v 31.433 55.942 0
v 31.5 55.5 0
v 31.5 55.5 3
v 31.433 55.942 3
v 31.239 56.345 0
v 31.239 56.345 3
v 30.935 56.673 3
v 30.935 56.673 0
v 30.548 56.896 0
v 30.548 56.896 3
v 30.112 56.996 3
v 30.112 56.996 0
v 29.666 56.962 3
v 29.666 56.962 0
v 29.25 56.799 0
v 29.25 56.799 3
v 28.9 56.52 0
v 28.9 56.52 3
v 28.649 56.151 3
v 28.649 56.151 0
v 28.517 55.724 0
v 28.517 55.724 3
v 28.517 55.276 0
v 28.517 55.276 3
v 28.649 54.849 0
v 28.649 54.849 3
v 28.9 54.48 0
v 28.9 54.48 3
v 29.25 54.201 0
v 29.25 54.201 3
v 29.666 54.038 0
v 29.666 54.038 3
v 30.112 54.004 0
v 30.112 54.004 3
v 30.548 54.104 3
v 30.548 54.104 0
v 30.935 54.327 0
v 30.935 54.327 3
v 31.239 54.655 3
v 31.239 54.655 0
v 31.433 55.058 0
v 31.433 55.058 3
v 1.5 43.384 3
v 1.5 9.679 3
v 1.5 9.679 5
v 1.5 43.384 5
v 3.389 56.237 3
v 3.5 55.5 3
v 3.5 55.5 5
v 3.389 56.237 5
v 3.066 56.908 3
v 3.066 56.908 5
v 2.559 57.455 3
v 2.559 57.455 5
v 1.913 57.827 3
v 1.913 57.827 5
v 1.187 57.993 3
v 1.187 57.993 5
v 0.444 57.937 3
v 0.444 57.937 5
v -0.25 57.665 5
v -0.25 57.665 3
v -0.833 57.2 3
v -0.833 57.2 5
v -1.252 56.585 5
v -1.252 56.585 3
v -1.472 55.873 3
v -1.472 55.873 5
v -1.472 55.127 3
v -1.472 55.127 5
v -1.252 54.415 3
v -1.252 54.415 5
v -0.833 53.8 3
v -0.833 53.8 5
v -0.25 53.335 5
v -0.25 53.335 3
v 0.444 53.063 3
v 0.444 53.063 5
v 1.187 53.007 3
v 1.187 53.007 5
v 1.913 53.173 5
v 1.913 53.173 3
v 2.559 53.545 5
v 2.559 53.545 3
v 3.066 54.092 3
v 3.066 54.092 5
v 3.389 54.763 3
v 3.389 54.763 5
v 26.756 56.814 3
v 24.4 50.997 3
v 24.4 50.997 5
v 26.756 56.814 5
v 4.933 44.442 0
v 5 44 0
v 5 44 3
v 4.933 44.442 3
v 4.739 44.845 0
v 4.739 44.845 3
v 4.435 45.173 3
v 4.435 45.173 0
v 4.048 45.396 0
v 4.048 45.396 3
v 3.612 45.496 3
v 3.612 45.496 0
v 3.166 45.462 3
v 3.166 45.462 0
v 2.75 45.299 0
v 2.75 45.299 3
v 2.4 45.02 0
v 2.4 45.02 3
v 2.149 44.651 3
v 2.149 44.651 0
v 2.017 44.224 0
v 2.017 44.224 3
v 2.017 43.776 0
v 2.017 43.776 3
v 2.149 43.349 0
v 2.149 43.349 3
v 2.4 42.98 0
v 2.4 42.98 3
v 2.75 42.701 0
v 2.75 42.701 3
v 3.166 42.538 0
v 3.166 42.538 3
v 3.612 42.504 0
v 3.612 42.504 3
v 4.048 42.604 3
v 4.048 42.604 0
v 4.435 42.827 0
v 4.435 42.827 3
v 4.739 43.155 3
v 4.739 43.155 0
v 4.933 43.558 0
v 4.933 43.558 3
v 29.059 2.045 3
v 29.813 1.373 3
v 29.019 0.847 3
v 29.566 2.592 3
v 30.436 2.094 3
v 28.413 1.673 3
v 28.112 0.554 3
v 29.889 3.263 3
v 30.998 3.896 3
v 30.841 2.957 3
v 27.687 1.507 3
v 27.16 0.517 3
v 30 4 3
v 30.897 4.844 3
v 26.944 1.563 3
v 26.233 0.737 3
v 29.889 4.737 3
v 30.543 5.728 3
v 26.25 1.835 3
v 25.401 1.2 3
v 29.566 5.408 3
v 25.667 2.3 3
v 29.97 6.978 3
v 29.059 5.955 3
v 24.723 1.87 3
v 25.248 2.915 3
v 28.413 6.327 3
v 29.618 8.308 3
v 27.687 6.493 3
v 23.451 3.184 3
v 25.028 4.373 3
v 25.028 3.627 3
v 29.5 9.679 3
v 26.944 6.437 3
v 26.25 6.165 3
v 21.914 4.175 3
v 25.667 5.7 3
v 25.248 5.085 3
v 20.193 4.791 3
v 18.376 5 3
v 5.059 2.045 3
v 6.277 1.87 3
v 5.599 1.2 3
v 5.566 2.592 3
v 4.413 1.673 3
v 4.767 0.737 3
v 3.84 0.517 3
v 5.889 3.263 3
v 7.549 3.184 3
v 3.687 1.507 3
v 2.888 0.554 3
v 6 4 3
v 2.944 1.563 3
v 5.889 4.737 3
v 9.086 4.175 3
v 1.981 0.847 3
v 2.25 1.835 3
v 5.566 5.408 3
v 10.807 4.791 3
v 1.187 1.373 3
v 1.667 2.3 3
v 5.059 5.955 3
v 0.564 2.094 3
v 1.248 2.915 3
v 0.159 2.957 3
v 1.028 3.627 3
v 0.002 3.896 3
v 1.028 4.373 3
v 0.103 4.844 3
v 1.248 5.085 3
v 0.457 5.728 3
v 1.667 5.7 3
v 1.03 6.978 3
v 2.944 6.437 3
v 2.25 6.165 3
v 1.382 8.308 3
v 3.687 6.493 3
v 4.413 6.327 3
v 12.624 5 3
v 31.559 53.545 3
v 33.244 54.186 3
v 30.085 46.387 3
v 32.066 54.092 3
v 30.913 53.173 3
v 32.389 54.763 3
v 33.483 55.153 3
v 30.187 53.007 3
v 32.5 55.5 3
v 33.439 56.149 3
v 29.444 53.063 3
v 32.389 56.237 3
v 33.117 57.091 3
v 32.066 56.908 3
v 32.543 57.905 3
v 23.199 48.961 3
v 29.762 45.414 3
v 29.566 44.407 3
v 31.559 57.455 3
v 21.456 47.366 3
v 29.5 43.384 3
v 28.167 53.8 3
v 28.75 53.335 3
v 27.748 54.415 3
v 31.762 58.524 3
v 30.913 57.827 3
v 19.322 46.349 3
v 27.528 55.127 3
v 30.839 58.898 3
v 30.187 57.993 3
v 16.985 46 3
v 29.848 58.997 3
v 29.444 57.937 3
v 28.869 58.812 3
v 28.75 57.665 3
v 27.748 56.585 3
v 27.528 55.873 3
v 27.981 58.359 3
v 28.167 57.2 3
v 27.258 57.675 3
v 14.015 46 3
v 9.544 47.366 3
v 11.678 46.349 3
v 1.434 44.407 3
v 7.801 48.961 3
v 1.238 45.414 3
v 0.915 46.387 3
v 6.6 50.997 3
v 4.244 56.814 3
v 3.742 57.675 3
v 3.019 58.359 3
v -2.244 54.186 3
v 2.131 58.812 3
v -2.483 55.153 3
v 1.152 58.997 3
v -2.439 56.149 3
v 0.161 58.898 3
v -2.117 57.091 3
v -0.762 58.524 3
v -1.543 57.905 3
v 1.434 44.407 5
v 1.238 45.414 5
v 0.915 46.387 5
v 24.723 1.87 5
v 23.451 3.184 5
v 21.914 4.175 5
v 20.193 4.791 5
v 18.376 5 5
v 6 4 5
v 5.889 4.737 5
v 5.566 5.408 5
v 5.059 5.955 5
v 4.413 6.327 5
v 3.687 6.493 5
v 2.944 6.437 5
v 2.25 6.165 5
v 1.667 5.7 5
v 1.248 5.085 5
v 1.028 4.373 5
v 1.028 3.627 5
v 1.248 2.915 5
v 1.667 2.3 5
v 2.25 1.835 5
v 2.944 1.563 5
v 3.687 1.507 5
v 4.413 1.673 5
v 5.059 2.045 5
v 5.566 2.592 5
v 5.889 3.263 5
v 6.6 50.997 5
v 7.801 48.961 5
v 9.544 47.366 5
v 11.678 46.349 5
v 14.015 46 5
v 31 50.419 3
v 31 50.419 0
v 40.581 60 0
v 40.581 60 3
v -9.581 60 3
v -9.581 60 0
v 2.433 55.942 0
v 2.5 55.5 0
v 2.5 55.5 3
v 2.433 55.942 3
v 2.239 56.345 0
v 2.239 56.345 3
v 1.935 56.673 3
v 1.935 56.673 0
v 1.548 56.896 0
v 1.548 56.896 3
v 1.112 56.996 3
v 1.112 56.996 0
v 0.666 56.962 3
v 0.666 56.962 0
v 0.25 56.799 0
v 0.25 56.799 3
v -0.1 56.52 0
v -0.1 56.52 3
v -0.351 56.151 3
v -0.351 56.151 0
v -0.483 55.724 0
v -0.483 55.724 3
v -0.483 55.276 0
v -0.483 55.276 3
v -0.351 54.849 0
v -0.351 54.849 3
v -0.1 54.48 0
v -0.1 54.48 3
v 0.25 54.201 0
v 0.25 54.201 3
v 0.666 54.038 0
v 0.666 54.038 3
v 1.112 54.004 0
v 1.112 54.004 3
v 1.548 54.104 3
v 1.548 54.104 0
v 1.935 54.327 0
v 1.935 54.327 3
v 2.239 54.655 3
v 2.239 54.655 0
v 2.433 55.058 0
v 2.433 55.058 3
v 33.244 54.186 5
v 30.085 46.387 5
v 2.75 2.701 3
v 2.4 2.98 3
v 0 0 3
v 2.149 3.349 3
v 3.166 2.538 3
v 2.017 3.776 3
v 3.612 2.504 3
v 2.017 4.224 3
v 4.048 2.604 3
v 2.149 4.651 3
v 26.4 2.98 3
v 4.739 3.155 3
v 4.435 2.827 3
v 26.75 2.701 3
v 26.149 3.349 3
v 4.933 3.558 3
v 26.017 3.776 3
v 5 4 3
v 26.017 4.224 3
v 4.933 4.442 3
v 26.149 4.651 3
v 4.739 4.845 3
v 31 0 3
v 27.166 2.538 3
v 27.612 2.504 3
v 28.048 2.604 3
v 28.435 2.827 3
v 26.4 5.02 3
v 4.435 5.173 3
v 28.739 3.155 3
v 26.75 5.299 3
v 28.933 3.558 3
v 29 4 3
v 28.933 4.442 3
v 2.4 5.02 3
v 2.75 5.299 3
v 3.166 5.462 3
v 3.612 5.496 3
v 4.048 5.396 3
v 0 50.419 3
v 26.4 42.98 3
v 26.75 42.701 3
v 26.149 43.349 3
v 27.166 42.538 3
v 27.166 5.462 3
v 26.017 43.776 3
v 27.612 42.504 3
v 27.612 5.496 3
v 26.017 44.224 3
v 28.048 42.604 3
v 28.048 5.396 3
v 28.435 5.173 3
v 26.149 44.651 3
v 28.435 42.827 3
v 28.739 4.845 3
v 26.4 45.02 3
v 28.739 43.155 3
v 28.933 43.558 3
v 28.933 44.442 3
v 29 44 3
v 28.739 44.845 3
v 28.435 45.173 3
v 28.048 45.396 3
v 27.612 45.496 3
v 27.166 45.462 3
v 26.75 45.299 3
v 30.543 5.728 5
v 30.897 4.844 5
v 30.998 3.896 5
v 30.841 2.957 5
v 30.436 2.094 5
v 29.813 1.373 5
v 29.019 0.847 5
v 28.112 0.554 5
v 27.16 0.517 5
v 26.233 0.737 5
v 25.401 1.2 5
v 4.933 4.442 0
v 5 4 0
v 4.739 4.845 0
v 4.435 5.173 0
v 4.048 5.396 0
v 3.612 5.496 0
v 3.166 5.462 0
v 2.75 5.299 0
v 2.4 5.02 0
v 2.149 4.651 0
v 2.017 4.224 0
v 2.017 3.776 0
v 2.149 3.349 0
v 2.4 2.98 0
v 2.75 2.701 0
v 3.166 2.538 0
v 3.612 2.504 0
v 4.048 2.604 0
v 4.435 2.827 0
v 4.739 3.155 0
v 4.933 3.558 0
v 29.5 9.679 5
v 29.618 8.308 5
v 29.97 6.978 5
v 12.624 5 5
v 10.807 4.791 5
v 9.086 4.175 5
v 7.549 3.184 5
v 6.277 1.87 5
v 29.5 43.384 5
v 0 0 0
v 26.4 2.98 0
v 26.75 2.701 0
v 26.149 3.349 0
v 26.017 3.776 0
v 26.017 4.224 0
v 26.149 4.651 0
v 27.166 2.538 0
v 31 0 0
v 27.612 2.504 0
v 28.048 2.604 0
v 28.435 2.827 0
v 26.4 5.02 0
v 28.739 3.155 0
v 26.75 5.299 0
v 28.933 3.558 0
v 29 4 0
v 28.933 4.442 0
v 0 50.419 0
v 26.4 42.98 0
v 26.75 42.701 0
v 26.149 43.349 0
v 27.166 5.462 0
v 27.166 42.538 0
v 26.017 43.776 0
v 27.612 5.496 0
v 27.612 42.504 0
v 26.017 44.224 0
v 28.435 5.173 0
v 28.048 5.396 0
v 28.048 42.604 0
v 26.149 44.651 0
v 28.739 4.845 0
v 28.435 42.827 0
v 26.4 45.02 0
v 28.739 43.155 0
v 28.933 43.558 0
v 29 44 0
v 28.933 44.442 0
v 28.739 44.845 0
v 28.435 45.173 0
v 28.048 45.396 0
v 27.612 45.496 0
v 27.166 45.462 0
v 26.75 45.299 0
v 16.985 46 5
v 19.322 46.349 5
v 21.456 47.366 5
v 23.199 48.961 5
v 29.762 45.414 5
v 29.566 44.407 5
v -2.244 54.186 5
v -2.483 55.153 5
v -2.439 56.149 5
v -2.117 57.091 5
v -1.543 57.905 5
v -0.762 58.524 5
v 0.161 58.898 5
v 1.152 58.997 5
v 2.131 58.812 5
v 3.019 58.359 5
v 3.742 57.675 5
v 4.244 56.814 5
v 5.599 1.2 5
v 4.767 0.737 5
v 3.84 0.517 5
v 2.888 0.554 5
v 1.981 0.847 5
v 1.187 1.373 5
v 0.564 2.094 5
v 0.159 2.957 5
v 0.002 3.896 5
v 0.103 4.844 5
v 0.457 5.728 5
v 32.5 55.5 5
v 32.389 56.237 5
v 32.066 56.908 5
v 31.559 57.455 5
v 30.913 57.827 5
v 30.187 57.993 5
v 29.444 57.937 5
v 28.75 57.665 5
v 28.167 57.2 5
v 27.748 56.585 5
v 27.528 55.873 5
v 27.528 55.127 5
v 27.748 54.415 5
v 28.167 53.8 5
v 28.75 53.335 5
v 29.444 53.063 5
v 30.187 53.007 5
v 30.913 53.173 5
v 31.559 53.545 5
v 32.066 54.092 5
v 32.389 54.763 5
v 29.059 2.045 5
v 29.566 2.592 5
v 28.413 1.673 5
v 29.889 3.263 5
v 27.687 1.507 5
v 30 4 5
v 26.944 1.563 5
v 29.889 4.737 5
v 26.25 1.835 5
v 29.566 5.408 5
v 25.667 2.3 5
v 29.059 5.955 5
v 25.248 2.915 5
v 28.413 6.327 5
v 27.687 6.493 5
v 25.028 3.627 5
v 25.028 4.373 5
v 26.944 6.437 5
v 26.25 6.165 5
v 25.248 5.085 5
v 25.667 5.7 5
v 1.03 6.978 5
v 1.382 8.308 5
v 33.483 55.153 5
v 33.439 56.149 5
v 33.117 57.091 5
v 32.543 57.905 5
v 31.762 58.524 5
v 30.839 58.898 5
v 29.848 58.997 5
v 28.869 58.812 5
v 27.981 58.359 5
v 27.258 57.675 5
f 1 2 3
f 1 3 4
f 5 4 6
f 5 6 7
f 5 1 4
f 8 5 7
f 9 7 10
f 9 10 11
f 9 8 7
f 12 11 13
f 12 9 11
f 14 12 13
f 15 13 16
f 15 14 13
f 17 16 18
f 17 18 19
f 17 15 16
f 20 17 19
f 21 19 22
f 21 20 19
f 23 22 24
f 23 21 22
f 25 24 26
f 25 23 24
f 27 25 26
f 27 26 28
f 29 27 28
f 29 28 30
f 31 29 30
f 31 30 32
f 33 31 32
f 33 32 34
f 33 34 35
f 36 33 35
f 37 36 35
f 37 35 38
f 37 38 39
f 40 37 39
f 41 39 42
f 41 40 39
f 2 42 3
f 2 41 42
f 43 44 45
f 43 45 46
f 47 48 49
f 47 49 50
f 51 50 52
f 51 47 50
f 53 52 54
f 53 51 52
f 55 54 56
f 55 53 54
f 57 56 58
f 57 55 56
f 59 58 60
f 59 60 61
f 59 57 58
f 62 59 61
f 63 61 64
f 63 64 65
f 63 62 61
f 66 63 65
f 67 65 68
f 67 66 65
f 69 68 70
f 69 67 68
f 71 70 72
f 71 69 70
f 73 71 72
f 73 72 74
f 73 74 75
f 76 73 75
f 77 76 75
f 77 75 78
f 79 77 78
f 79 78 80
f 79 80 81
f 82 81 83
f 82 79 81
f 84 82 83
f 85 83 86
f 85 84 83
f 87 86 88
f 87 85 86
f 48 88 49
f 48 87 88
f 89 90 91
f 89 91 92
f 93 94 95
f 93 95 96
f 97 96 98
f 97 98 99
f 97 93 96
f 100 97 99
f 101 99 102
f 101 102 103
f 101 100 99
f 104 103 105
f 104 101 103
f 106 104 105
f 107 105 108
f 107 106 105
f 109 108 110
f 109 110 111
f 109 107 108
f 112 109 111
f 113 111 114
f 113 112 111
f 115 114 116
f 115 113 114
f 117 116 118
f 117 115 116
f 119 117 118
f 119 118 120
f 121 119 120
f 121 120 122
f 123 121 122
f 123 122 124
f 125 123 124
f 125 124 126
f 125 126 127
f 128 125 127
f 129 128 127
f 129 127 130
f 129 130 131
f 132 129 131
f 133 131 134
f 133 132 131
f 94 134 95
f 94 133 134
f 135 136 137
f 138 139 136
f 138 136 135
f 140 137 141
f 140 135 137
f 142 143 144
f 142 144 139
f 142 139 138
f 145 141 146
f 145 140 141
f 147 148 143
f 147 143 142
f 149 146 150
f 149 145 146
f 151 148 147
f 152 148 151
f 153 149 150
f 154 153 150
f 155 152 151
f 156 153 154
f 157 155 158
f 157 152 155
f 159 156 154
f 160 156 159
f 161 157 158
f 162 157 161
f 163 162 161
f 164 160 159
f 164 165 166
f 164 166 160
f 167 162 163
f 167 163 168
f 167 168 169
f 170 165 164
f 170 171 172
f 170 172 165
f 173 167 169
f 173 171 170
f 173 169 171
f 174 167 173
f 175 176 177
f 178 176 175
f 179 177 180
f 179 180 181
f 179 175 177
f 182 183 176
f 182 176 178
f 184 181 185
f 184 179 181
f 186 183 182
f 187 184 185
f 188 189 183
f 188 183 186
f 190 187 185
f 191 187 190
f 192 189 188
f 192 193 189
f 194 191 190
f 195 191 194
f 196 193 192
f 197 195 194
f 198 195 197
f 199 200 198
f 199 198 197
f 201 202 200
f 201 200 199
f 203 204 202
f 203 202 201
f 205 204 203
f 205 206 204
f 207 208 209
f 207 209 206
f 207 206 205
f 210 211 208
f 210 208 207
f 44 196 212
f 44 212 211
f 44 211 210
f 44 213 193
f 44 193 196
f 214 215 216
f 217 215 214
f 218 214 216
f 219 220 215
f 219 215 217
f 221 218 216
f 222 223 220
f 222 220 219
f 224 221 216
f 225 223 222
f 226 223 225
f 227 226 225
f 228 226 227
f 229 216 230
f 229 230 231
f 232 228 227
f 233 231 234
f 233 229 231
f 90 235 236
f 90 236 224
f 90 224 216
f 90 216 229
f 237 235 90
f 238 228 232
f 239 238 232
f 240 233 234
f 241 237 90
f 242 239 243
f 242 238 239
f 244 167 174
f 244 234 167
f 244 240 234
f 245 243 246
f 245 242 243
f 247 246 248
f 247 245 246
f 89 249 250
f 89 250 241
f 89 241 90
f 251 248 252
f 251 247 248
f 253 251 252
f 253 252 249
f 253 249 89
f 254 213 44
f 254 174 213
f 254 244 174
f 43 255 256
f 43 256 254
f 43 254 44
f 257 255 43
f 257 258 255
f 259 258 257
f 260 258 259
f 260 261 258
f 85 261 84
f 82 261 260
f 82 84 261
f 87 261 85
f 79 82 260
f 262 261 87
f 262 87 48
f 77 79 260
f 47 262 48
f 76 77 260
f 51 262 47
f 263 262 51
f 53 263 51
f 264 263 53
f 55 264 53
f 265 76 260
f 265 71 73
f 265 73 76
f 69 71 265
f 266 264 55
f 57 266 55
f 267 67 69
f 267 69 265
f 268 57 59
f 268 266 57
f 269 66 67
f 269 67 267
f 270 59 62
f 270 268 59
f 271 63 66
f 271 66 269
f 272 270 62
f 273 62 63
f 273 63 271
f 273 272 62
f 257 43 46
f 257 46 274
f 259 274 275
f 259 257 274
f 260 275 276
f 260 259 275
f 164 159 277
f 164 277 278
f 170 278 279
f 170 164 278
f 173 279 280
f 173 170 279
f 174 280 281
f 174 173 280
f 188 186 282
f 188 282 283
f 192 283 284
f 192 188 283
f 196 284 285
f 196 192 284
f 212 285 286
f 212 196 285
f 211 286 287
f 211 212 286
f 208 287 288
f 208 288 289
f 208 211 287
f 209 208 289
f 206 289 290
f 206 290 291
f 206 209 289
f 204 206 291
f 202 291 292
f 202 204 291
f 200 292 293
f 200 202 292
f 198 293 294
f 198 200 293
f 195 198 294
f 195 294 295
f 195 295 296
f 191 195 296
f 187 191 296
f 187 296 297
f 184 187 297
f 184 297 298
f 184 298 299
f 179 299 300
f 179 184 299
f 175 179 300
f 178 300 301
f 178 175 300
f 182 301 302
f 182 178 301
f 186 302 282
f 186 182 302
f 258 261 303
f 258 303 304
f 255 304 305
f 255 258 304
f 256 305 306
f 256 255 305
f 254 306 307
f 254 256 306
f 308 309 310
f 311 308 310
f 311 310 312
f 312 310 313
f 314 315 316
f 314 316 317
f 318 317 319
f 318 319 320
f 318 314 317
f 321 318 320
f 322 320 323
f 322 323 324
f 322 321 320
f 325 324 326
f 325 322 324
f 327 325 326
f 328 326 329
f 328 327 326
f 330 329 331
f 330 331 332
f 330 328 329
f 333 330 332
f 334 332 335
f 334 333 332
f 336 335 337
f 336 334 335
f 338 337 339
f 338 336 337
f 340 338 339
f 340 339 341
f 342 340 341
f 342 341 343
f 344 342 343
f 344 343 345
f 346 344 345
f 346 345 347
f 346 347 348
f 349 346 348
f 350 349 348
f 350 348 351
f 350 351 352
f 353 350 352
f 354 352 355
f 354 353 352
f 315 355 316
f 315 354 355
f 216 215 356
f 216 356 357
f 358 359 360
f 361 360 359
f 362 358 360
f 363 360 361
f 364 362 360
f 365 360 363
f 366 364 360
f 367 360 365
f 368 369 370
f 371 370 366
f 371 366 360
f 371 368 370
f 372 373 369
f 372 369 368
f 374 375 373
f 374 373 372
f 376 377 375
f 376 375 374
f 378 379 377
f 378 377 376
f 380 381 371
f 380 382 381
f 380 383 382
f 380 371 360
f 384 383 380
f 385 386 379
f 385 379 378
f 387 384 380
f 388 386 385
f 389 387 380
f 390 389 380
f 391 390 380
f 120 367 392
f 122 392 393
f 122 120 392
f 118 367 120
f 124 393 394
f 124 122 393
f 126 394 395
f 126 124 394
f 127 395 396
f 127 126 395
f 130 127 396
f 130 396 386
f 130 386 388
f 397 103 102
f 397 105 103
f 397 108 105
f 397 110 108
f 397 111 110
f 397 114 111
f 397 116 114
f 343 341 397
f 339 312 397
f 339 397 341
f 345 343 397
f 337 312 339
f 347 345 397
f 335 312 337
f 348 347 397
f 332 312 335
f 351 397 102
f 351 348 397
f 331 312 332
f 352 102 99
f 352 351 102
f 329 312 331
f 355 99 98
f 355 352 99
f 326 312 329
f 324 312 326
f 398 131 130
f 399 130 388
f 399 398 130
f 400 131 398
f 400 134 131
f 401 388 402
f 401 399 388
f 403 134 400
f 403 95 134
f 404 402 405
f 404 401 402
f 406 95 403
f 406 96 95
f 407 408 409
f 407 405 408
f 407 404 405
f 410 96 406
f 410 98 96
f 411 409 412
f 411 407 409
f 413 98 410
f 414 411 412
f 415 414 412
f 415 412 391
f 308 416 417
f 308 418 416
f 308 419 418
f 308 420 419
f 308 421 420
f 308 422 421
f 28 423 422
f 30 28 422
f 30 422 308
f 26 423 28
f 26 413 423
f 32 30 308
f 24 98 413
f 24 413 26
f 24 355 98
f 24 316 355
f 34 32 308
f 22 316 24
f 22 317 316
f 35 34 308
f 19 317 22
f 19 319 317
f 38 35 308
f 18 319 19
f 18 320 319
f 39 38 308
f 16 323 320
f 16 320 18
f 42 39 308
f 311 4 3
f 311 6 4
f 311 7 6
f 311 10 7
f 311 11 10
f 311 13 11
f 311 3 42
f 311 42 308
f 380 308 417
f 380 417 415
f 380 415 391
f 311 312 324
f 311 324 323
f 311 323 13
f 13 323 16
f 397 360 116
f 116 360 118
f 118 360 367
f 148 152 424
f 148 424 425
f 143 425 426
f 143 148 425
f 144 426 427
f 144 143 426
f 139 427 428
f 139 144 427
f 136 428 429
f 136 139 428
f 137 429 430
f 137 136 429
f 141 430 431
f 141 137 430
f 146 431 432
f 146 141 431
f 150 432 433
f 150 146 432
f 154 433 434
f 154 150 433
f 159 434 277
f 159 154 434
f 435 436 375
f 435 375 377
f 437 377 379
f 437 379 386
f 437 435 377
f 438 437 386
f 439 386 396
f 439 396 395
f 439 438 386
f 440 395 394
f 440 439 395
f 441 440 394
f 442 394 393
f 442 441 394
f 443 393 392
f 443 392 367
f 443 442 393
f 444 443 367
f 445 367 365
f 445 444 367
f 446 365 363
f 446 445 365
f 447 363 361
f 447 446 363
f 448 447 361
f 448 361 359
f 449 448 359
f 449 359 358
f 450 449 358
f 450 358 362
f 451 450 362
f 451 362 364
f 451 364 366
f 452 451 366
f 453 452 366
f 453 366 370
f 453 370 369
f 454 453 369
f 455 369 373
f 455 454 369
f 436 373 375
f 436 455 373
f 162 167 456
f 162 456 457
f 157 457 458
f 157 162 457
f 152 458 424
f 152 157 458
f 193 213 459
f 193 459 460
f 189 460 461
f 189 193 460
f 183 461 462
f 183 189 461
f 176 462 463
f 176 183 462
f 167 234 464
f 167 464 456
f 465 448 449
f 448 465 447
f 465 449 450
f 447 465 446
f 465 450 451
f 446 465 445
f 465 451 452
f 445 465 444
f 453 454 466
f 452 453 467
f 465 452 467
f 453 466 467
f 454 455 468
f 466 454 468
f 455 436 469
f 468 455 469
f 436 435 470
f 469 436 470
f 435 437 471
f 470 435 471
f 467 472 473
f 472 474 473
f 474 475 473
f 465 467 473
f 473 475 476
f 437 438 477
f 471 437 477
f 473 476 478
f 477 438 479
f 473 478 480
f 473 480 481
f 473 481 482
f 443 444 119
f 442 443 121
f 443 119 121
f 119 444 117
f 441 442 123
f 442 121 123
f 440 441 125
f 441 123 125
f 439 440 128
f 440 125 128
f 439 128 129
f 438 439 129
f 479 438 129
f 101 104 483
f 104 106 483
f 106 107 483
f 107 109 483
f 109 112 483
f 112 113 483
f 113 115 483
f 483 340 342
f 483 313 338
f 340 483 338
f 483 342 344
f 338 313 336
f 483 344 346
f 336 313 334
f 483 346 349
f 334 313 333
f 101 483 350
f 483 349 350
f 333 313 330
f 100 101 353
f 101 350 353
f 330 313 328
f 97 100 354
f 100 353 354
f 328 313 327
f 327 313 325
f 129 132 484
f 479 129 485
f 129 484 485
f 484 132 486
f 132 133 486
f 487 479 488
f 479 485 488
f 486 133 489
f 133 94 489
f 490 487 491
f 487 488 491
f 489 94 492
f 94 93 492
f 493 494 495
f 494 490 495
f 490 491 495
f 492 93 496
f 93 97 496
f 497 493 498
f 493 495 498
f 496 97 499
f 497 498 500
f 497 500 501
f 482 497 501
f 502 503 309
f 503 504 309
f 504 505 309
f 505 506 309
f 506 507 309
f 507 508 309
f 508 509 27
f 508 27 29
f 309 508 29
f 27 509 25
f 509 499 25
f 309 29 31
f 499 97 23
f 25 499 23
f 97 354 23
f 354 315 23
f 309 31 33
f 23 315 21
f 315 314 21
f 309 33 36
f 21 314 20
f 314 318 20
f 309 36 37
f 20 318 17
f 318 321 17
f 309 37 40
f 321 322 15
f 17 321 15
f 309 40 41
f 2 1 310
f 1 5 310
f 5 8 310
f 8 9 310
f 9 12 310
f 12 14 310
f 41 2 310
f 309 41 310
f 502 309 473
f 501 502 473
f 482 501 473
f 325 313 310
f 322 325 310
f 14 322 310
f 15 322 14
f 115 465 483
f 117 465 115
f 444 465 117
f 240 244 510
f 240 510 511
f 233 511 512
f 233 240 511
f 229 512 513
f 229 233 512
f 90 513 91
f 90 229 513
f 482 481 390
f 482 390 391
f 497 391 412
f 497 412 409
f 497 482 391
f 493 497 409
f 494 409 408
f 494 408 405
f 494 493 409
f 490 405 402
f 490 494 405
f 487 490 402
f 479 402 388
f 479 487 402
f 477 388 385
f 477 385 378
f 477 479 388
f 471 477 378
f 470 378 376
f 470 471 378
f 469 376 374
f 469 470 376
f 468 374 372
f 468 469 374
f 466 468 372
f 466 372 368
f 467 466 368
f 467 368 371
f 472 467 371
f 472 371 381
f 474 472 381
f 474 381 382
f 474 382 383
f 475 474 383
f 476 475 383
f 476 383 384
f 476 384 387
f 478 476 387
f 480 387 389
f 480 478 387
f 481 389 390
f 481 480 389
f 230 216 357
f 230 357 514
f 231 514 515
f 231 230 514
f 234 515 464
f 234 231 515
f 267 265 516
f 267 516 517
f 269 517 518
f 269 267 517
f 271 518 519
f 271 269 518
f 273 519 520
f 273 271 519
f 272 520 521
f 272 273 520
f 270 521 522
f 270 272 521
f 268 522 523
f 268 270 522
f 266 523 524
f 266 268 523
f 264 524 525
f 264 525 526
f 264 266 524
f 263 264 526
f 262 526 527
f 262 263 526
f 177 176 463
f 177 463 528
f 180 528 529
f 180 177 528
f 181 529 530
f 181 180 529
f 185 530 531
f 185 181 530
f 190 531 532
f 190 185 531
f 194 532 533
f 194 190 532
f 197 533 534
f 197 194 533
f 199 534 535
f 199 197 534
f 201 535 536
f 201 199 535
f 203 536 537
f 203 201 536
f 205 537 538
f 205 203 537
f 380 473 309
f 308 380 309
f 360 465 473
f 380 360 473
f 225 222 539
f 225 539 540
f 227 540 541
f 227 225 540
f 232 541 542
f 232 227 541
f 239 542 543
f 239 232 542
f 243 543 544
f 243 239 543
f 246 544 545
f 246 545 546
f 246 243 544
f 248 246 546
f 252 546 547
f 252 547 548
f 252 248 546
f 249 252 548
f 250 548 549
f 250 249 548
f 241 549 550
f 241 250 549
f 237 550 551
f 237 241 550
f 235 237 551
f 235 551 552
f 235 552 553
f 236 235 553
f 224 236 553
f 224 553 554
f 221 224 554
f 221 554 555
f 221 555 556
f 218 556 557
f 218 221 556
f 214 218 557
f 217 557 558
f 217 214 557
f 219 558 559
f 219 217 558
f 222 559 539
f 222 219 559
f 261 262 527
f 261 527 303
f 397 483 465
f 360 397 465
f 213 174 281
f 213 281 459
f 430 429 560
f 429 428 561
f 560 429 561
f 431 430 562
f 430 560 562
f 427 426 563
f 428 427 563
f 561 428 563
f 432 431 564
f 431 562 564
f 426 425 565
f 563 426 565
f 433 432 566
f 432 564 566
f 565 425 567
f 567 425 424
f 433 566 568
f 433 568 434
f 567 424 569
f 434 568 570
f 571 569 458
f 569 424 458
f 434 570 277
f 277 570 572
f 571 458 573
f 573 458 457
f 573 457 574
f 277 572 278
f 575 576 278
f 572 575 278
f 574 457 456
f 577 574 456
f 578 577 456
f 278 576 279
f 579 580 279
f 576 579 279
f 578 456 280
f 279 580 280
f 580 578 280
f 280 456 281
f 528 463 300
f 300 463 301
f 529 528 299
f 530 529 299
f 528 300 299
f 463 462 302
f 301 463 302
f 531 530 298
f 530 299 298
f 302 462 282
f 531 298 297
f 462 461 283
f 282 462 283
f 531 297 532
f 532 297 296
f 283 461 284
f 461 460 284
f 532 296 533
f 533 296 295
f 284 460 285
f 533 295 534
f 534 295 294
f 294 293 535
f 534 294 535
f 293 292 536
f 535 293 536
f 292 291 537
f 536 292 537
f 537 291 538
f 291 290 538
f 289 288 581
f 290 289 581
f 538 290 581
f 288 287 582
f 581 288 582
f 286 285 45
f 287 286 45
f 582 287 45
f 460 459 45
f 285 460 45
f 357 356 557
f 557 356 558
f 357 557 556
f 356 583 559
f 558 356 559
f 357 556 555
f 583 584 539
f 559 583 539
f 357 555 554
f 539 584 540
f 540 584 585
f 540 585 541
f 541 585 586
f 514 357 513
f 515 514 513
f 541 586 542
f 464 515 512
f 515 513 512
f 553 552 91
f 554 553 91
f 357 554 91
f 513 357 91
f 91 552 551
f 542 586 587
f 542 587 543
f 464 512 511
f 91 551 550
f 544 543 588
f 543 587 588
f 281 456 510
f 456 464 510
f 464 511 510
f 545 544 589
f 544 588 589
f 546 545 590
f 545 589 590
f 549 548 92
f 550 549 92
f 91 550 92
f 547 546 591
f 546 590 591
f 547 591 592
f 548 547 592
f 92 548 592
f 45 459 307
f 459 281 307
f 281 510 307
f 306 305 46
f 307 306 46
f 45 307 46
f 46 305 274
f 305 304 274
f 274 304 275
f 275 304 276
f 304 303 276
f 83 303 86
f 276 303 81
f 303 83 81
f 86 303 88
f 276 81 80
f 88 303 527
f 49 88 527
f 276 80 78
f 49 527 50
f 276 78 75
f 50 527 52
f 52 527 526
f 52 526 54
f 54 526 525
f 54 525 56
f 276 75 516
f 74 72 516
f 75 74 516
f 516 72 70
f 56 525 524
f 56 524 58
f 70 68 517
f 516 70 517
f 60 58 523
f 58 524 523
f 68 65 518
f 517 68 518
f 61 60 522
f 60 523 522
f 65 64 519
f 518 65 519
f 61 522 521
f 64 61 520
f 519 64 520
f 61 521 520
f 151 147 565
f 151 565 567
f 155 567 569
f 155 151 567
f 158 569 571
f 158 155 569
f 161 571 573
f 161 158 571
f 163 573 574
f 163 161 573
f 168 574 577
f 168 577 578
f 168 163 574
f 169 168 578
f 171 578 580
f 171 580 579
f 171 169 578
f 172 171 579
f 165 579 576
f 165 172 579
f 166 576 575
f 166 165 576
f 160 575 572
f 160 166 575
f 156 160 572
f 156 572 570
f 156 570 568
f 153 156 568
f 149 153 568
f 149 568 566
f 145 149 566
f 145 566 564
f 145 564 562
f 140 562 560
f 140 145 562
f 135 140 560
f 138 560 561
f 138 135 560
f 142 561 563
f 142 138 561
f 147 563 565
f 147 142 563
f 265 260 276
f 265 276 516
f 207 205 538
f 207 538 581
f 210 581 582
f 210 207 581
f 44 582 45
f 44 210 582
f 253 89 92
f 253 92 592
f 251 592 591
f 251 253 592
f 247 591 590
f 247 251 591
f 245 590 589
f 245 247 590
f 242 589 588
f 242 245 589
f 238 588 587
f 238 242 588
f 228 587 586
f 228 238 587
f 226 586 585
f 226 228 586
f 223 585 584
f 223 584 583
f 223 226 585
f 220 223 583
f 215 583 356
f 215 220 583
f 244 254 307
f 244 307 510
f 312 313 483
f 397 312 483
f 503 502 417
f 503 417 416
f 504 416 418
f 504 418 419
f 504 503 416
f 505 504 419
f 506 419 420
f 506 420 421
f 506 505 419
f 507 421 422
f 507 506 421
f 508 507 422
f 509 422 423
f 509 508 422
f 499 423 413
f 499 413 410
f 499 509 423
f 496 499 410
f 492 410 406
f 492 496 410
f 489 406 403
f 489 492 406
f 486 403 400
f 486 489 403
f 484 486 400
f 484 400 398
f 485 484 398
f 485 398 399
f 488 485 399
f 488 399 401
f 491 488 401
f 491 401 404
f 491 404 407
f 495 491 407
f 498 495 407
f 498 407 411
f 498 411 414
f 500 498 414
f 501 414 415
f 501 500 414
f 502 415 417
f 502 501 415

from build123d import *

# Parameters (mm, degrees)
SKETCH1_R           = 1.5
BOSS_EXTRUDE1_DEPTH = 3
SKETCH2_R           = 2.5
BOSS_EXTRUDE2_DEPTH = 2


with BuildPart() as part:
    # Sketch1 → Boss-Extrude1 (new body)
    with BuildSketch(Plane.XY):
        Polygon((0, 0), (31, 0), (31, 50.418881682), (40.581118318, 60), (-9.581118318, 60), (0, 50.418881682), align=None)
        with Locations((30, 55.5)):
            Circle(SKETCH1_R, mode=Mode.SUBTRACT)
        with Locations((27.5, 44)):
            Circle(SKETCH1_R, mode=Mode.SUBTRACT)
        with Locations((27.5, 4)):
            Circle(SKETCH1_R, mode=Mode.SUBTRACT)
        with Locations((3.5, 4)):
            Circle(SKETCH1_R, mode=Mode.SUBTRACT)
        with Locations((3.5, 44)):
            Circle(SKETCH1_R, mode=Mode.SUBTRACT)
        with Locations((1, 55.5)):
            Circle(SKETCH1_R, mode=Mode.SUBTRACT)
    extrude(amount=BOSS_EXTRUDE1_DEPTH)


with BuildPart() as body_2:
    # Sketch2 → Boss-Extrude2 (new body)
    with BuildSketch(Plane.XY.offset(3)):
        with BuildLine():
            Line((14.015011123, 46), (16.984988877, 46))
            ThreePointArc((16.984988877, 46), (21.455677143, 47.365774617), (24.39987727, 50.996763393))
            Line((24.39987727, 50.996763393), (26.755986328, 56.813916016))
            ThreePointArc((26.755986328, 56.813916016), (31.313916016, 58.744013672), (33.244013672, 54.186083984))
            Line((33.244013672, 54.186083984), (30.085111607, 46.386862904))
            ThreePointArc((30.085111607, 46.386862904), (29.647640255, 44.913478063), (29.5, 43.383626297))
            Line((29.5, 43.383626297), (29.5, 9.678908346))
            ThreePointArc((29.5, 9.678908346), (29.765267493, 7.635892672), (30.543478261, 5.72836341))
            ThreePointArc((30.543478261, 5.72836341), (29.433997179, 1.082868719), (24.723086671, 1.869565217))
            ThreePointArc((24.723086671, 1.869565217), (21.914463152, 4.17483525), (18.375856205, 5))
            Line((18.375856205, 5), (12.624143795, 5))
            ThreePointArc((12.624143795, 5), (9.085536848, 4.17483525), (6.276913329, 1.869565217))
            ThreePointArc((6.276913329, 1.869565217), (1.566002821, 1.082868719), (0.456521739, 5.72836341))
            ThreePointArc((0.456521739, 5.72836341), (1.234732507, 7.635892672), (1.5, 9.678908346))
            Line((1.5, 9.678908346), (1.5, 43.383626297))
            ThreePointArc((1.5, 43.383626297), (1.352359745, 44.913478063), (0.914888393, 46.386862904))
            Line((0.914888393, 46.386862904), (-2.244013672, 54.186083984))
            ThreePointArc((-2.244013672, 54.186083984), (-0.313916016, 58.744013672), (4.244013672, 56.813916016))
            Line((4.244013672, 56.813916016), (6.60012273, 50.996763393))
            ThreePointArc((6.60012273, 50.996763393), (9.544322857, 47.365774617), (14.015011123, 46))
        make_face()
        with Locations((27.5, 4)):
            Circle(SKETCH2_R, mode=Mode.SUBTRACT)
        with Locations((30, 55.5)):
            Circle(SKETCH2_R, mode=Mode.SUBTRACT)
        with Locations((1, 55.5)):
            Circle(SKETCH2_R, mode=Mode.SUBTRACT)
        with Locations((3.5, 4)):
            Circle(SKETCH2_R, mode=Mode.SUBTRACT)
    extrude(amount=BOSS_EXTRUDE2_DEPTH)


solid = Compound([part.part, body_2.part])
